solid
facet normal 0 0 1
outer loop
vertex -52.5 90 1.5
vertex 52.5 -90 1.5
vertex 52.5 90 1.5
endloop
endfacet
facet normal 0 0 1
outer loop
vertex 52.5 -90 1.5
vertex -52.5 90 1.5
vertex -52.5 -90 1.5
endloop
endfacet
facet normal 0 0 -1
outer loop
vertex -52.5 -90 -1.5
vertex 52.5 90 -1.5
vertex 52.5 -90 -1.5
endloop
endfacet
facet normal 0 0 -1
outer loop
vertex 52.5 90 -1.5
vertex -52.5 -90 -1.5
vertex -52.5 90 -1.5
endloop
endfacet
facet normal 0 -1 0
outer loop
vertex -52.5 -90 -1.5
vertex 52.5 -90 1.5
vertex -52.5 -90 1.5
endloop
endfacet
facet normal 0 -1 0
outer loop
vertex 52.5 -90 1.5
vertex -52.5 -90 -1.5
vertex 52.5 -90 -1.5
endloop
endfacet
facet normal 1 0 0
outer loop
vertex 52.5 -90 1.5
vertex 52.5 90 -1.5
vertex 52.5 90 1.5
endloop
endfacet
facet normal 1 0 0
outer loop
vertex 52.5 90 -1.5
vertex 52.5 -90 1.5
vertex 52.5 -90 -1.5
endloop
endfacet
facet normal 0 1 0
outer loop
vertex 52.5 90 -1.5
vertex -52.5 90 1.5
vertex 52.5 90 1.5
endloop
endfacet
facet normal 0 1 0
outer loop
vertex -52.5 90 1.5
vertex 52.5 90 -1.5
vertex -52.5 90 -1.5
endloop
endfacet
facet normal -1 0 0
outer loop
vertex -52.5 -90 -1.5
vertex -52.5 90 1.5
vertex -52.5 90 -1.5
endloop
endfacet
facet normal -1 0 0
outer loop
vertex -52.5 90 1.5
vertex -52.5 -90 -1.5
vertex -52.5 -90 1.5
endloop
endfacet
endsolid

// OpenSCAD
// ========================================
// a 105 x 180 x 3 mm plate
// NeuroCAD canonical IR; dimensions are millimetres
// ========================================
$fn = 48;

cube(size=[105, 180, 3], center=true);
